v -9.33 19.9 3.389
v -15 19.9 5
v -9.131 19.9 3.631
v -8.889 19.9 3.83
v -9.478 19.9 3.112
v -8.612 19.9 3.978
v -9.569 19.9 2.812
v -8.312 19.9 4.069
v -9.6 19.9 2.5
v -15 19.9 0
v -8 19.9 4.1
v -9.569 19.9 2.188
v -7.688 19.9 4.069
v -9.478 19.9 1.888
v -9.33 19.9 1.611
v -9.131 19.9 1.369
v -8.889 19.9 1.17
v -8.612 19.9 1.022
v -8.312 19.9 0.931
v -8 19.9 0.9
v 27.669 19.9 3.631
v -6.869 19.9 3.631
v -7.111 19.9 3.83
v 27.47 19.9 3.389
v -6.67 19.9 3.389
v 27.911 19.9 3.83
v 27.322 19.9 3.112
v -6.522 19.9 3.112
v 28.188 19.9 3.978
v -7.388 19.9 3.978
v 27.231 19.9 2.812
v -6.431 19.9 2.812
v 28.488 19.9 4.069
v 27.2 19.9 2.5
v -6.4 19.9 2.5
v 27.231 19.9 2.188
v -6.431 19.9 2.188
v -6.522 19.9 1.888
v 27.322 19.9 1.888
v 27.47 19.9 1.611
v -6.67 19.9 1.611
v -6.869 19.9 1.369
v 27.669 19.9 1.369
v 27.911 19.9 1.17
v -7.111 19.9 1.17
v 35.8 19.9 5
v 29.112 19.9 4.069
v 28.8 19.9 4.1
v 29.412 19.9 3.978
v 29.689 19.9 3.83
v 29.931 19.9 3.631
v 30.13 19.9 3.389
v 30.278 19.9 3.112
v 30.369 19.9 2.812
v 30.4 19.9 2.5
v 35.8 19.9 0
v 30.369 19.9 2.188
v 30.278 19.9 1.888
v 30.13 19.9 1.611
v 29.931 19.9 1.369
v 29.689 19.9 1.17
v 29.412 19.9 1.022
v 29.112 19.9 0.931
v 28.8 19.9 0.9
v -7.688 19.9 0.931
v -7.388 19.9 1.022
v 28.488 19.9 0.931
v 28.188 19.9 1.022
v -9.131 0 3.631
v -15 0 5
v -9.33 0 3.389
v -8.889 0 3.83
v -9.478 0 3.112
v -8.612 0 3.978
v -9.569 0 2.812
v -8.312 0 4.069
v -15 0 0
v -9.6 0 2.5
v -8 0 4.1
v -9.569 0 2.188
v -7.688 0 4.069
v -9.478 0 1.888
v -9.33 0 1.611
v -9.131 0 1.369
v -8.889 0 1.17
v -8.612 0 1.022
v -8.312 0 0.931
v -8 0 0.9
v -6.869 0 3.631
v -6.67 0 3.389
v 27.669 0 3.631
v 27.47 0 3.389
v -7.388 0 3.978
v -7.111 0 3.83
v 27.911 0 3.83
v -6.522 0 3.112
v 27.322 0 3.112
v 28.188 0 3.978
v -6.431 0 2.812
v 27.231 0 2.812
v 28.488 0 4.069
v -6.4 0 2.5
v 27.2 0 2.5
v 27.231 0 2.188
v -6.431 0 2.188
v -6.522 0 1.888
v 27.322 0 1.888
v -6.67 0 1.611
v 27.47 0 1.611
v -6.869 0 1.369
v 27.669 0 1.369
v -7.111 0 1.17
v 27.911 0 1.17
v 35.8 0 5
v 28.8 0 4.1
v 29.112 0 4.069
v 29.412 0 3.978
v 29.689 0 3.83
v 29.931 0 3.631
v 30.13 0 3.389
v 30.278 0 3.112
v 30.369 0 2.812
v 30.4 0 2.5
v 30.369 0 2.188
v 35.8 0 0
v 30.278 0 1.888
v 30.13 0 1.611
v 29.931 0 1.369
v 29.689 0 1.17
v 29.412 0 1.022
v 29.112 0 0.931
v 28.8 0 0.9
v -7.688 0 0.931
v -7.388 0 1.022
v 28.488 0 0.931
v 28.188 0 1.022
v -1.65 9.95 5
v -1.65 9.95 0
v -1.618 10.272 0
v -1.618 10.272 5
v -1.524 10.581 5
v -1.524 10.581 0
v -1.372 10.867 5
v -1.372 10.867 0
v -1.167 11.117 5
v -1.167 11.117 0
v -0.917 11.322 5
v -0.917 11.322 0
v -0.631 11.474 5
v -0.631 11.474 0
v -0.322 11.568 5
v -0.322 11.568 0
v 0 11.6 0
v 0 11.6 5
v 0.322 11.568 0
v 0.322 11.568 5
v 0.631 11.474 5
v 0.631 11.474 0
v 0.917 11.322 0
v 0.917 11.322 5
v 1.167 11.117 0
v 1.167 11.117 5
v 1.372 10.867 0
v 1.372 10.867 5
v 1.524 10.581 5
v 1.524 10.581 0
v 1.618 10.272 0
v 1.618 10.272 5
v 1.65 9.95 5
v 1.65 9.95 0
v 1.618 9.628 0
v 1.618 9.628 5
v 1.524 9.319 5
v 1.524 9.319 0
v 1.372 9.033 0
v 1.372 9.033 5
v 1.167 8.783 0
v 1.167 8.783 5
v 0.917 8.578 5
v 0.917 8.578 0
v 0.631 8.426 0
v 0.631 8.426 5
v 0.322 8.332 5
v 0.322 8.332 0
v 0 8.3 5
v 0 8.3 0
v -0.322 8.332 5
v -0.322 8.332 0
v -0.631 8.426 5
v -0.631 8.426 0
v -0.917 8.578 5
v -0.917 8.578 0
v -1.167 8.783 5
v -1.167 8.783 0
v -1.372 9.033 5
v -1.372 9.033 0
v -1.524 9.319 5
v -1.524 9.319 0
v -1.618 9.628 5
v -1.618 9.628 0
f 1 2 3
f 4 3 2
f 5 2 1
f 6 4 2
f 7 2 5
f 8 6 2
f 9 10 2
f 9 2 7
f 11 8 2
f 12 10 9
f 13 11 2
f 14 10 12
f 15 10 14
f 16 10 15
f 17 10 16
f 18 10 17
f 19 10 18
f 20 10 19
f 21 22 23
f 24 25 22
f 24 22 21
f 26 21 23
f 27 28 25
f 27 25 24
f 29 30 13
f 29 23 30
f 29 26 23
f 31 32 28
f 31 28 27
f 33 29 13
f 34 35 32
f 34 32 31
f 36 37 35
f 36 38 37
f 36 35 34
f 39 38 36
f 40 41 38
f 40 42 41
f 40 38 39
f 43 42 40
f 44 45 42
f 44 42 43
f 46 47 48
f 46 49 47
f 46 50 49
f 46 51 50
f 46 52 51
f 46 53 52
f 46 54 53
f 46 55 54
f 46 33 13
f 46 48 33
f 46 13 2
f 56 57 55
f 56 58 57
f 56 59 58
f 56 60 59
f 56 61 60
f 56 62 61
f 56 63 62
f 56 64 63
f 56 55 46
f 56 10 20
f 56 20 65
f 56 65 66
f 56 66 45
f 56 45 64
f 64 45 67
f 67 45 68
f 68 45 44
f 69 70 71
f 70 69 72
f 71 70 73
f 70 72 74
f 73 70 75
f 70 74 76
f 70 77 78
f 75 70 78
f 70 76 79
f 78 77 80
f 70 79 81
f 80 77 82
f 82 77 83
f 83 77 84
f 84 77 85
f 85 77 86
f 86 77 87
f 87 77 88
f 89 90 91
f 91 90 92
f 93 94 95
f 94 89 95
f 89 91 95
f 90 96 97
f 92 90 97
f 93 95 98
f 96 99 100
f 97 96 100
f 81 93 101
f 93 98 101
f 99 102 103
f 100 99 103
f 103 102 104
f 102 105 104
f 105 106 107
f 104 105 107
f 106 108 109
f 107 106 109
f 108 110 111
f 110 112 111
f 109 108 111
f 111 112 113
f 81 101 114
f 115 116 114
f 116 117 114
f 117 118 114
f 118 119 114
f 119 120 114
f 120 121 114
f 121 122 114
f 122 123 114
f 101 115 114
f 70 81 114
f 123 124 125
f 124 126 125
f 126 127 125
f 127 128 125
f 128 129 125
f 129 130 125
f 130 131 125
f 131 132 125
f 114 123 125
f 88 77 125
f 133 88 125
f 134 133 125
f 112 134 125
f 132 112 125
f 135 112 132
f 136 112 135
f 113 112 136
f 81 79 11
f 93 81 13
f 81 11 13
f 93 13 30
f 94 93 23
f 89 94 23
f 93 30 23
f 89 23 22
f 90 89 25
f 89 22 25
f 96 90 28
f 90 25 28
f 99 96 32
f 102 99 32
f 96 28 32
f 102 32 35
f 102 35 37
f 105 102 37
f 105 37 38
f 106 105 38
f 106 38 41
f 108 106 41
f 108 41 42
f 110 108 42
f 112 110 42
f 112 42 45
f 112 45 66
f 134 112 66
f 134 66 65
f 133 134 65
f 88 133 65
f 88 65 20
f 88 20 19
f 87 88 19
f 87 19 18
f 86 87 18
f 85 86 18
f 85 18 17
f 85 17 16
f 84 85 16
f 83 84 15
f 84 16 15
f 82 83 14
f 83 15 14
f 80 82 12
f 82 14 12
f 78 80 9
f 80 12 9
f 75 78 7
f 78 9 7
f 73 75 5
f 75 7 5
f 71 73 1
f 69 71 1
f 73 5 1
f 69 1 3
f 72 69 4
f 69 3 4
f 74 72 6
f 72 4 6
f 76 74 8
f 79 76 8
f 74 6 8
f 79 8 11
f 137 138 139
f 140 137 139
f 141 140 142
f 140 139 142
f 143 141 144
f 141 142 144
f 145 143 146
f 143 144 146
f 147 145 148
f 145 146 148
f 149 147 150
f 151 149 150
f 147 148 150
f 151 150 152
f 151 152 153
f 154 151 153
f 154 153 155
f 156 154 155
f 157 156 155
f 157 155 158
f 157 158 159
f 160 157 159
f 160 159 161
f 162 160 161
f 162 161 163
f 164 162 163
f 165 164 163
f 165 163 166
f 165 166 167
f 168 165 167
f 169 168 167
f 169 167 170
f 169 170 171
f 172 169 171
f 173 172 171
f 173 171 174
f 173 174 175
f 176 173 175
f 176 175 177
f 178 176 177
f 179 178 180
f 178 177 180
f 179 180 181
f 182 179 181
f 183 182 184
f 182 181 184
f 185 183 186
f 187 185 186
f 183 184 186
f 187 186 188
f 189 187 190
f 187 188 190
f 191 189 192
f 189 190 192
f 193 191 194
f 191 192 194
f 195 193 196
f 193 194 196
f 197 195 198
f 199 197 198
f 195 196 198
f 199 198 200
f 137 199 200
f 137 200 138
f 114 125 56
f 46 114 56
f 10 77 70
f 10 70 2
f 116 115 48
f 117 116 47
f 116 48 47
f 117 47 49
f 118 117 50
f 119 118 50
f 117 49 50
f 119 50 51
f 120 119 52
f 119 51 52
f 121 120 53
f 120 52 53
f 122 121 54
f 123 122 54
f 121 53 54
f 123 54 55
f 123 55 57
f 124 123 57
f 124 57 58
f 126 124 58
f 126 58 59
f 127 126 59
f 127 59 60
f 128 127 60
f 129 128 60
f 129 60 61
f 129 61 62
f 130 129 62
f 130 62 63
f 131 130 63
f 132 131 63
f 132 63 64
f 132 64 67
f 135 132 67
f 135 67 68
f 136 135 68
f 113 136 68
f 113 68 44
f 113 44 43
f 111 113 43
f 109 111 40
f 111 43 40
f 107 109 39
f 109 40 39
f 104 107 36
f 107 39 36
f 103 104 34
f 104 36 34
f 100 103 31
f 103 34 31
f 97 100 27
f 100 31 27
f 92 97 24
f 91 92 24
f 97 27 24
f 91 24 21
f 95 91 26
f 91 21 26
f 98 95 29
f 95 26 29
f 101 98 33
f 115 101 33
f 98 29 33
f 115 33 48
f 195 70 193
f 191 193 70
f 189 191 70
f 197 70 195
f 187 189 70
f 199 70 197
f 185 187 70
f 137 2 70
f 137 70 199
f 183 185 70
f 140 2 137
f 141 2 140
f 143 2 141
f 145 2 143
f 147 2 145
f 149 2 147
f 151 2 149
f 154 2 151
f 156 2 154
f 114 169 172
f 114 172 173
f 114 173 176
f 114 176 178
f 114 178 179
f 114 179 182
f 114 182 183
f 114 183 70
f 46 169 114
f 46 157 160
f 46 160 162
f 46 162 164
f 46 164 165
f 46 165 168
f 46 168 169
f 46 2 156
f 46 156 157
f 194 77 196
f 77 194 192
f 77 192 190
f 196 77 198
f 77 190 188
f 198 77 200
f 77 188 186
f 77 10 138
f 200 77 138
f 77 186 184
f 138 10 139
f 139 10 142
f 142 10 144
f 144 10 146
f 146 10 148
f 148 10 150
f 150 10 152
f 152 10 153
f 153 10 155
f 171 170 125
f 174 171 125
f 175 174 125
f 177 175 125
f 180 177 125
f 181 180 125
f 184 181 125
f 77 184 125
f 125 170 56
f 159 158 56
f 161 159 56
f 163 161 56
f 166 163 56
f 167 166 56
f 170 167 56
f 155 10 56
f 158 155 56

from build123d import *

# Parameters (mm, degrees)
ESQUISSE1_W             = 50.8
ESQUISSE1_H             = 19.9
EXTRUSION1_DEPTH        = 5
TROU_TARAUD_M4X0_71_D   = 3.3
ESQUISSE4_R             = 1.6
ENL_V_MAT_EXTRU_1_DEPTH = 42.263179713


with BuildPart() as part:
    # Esquisse1 → Extrusion1 (new body)
    with BuildSketch(Plane.XY):
        with Locations((10.4, 9.95)):
            Rectangle(ESQUISSE1_W, ESQUISSE1_H)
    extrude(amount=EXTRUSION1_DEPTH)

    # Trou taraudé M4x0.71 (through all)
    with Locations(Plane.XY.offset(5)):
        with Locations((0, 9.95)):
            Hole(TROU_TARAUD_M4X0_71_D / 2)

    # Esquisse4 → Enlèv. mat.-Extru.1 (cut, through all)
    with BuildSketch(Plane(origin=(0, 19.9, 0), x_dir=(1, 0, 0), z_dir=(0, 1, 0))):
        with Locations(Location((-8, -2.5, 0), (0, 0, 270))):
            Circle(ESQUISSE4_R)
        with Locations(Location((28.8, -2.5, 0), (0, 0, 270))):
            Circle(ESQUISSE4_R)
    extrude(amount=-ENL_V_MAT_EXTRU_1_DEPTH, mode=Mode.SUBTRACT)


solid = part.part
